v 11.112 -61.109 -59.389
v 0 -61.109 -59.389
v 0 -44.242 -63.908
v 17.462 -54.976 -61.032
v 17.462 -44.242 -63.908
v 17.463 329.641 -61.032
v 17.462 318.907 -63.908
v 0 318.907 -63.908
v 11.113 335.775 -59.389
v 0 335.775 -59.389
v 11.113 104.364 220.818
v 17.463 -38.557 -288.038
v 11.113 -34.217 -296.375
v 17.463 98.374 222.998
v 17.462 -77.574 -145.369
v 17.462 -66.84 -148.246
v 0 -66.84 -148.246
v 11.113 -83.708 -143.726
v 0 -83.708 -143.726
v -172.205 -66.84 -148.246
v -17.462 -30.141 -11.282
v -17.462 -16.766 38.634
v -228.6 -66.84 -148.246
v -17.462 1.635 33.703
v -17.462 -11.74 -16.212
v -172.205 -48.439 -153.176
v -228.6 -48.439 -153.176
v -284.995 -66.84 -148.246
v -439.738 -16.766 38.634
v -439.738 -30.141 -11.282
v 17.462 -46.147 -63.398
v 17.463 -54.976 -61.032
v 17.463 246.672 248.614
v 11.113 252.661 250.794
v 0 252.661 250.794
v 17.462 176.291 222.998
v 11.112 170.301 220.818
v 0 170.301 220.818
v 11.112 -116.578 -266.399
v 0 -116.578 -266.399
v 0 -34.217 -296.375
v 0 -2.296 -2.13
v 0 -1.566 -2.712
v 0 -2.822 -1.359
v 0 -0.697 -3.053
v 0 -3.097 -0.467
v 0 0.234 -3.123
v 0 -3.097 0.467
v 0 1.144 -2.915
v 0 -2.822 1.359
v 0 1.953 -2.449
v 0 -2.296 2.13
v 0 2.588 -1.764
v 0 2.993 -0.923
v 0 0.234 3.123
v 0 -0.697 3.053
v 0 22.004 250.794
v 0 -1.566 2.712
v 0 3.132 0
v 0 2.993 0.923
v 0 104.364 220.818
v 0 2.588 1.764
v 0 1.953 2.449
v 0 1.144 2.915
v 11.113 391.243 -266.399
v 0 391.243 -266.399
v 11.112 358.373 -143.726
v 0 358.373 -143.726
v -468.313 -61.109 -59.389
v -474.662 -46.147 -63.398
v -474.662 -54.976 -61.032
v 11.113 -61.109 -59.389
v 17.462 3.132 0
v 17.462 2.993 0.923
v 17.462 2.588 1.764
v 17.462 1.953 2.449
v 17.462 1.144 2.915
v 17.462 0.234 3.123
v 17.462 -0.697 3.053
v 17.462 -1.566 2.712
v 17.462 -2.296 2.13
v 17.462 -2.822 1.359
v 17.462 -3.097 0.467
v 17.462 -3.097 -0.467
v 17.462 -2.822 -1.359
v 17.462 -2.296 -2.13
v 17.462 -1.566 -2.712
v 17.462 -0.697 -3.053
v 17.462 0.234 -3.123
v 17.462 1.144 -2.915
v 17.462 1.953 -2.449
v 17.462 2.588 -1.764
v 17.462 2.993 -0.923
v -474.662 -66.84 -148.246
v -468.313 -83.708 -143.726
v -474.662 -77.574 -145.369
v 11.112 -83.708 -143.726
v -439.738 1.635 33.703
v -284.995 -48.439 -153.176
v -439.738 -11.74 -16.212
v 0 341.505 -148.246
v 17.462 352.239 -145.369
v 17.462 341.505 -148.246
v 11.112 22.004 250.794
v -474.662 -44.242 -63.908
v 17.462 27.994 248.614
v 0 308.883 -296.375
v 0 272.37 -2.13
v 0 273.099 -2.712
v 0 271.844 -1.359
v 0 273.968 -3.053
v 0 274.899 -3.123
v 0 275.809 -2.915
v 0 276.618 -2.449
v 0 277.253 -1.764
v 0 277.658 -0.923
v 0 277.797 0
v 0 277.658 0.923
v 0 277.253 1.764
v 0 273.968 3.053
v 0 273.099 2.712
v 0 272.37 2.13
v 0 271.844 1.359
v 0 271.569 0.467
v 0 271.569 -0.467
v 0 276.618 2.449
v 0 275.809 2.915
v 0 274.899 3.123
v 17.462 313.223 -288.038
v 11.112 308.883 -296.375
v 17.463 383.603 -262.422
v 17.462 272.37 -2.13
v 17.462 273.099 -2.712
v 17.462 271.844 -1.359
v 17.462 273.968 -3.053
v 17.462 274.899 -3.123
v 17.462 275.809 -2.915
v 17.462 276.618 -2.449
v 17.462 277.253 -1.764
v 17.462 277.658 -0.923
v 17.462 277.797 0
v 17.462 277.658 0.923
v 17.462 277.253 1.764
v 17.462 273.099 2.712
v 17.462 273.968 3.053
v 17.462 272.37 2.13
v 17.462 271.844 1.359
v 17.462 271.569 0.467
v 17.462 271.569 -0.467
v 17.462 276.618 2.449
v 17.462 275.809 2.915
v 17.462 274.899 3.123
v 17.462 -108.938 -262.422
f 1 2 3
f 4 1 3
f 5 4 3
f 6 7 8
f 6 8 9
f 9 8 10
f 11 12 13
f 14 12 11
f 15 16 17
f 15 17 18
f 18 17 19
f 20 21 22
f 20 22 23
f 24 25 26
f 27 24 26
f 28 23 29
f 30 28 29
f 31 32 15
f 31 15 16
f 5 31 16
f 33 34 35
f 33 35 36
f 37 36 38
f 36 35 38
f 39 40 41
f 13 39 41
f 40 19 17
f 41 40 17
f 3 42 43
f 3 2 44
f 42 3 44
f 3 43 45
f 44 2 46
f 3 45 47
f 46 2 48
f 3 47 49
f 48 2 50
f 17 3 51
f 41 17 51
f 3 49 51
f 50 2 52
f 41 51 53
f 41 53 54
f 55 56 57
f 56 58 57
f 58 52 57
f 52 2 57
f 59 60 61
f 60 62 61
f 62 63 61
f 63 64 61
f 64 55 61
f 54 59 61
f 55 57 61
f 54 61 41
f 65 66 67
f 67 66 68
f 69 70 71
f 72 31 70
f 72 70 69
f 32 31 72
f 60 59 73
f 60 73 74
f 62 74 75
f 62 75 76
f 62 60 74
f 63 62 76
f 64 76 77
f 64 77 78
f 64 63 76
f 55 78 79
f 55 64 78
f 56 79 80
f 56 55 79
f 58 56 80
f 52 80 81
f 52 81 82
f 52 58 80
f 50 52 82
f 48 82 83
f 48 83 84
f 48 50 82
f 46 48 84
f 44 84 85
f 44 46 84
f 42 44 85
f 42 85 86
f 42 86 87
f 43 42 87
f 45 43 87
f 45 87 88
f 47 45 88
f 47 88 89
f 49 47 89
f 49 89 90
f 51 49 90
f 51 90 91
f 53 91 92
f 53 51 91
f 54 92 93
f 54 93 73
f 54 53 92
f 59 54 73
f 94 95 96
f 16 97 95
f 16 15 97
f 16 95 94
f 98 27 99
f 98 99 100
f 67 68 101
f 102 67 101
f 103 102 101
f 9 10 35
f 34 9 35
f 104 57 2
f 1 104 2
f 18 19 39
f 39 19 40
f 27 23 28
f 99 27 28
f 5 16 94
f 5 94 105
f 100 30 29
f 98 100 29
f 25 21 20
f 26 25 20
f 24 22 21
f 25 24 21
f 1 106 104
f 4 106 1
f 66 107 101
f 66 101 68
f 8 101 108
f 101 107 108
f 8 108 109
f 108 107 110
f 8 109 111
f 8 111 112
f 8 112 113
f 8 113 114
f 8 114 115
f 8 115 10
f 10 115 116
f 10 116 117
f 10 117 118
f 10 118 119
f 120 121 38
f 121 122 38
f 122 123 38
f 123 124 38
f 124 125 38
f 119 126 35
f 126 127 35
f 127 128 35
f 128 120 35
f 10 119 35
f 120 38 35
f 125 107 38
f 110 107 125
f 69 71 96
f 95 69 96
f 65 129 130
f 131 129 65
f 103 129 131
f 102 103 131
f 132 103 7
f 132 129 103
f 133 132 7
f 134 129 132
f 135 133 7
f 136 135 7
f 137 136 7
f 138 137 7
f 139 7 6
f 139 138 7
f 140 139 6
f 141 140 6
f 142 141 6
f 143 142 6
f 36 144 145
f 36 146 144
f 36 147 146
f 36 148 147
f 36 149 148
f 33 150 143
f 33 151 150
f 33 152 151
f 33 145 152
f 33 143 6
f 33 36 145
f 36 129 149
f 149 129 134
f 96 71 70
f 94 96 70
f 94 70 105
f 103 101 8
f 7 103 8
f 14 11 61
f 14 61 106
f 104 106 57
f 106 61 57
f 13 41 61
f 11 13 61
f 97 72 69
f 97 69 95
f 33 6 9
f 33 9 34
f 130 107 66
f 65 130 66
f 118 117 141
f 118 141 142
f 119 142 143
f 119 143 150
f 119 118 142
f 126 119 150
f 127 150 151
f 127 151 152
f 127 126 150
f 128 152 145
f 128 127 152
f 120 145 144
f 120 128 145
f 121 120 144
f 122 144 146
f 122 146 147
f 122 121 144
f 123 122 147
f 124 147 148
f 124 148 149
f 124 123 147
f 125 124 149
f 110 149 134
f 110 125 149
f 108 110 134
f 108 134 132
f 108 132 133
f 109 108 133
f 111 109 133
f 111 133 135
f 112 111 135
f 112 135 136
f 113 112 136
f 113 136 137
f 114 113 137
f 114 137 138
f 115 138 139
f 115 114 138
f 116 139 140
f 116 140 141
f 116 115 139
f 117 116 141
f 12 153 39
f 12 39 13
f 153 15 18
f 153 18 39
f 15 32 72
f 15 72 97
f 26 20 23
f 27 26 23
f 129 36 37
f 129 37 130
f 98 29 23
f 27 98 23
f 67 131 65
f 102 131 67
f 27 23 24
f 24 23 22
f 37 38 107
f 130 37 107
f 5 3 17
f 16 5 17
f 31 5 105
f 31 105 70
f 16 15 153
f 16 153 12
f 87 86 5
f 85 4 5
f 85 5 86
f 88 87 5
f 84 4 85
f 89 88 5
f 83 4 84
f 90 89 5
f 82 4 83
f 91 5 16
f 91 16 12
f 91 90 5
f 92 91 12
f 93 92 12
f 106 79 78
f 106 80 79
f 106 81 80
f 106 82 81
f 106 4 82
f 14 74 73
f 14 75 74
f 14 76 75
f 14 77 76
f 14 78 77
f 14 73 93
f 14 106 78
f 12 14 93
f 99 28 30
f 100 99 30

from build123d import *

# Parameters (mm, degrees)
F0_R      = 3.13175
F1_DEPTH  = 17.4625
F3_DEPTH  = 492.125
F4_SIZE   = 6.35
F4_2_SIZE = 6.35
F6_DEPTH  = 19.05


with BuildPart() as f1:
    # F0 (on Right) → F1 (new body)
    with BuildSketch(Plane.YZ):
        Polygon((104.364186, 220.817649), (22.003868, 250.794353), (-61.109397, -59.388579), (-44.241918, -63.908207), (-66.840055, -148.245605), (-83.707535, -143.725978), (-116.577554, -266.398558), (-34.217236, -296.375262), align=None)
        Circle(F0_R, mode=Mode.SUBTRACT)
        Polygon((252.661457, 250.794353), (170.30114, 220.817649), (308.882562, -296.375262), (391.24288, -266.398558), (358.372861, -143.725978), (341.505381, -148.245605), (318.907244, -63.908207), (335.774723, -59.388579), align=None)
        with Locations((274.665326, 0)):
            Circle(F0_R, mode=Mode.SUBTRACT)
    extrude(amount=F1_DEPTH)

    # F4#2
    f4_2_edges = [f1.edges().sort_by_distance(p)[0] for p in [
        (17.4625, -19.552765, 95.702887),
        (17.4625, 35.073475, -37.778806),
        (17.4625, -100.142545, -205.062268),
        (17.4625, -75.397395, -281.38691),
        (17.4625, 239.591851, -37.778806),
        (17.4625, 294.21809, 95.702887),
        (17.4625, 374.80787, -205.062268),
        (17.4625, 350.062721, -281.38691),
    ]]
    chamfer(f4_2_edges, length=F4_2_SIZE)


with BuildPart() as f3:
    # F2 (on face) → F3 (new body)
    with BuildSketch(Plane.YZ.offset(17.4625)):
        Polygon((-66.840055, -148.245605), (-44.241918, -63.908207), (-46.147437, -63.397624), (-61.109397, -59.388579), (-83.707535, -143.725978), align=None)
    extrude(amount=-F3_DEPTH)

    # F4
    f4_edges = [f3.edges().sort_by_distance(p)[0] for p in [
        (17.4625, -72.408466, -101.557278),
        (-474.6625, -72.408466, -101.557278),
    ]]
    chamfer(f4_edges, length=F4_SIZE)


with BuildPart() as f6:
    # F5 (on face) → F6 (new body)
    with BuildSketch(Plane(origin=(0, -25.30122, 6.779441), x_dir=(-1, 0, 0), z_dir=(0, 0.965926, -0.258819))):
        Polygon((17.4625, 32.978135), (17.4625, -18.698484), (172.204866, -160.493738), (228.6, -160.493738), align=None)
        Polygon((439.7375, 32.978135), (228.6, -160.493738), (284.995134, -160.493738), (439.7375, -18.698484), align=None)
    extrude(amount=F6_DEPTH)


solid = Compound([f1.part, f3.part, f6.part])
